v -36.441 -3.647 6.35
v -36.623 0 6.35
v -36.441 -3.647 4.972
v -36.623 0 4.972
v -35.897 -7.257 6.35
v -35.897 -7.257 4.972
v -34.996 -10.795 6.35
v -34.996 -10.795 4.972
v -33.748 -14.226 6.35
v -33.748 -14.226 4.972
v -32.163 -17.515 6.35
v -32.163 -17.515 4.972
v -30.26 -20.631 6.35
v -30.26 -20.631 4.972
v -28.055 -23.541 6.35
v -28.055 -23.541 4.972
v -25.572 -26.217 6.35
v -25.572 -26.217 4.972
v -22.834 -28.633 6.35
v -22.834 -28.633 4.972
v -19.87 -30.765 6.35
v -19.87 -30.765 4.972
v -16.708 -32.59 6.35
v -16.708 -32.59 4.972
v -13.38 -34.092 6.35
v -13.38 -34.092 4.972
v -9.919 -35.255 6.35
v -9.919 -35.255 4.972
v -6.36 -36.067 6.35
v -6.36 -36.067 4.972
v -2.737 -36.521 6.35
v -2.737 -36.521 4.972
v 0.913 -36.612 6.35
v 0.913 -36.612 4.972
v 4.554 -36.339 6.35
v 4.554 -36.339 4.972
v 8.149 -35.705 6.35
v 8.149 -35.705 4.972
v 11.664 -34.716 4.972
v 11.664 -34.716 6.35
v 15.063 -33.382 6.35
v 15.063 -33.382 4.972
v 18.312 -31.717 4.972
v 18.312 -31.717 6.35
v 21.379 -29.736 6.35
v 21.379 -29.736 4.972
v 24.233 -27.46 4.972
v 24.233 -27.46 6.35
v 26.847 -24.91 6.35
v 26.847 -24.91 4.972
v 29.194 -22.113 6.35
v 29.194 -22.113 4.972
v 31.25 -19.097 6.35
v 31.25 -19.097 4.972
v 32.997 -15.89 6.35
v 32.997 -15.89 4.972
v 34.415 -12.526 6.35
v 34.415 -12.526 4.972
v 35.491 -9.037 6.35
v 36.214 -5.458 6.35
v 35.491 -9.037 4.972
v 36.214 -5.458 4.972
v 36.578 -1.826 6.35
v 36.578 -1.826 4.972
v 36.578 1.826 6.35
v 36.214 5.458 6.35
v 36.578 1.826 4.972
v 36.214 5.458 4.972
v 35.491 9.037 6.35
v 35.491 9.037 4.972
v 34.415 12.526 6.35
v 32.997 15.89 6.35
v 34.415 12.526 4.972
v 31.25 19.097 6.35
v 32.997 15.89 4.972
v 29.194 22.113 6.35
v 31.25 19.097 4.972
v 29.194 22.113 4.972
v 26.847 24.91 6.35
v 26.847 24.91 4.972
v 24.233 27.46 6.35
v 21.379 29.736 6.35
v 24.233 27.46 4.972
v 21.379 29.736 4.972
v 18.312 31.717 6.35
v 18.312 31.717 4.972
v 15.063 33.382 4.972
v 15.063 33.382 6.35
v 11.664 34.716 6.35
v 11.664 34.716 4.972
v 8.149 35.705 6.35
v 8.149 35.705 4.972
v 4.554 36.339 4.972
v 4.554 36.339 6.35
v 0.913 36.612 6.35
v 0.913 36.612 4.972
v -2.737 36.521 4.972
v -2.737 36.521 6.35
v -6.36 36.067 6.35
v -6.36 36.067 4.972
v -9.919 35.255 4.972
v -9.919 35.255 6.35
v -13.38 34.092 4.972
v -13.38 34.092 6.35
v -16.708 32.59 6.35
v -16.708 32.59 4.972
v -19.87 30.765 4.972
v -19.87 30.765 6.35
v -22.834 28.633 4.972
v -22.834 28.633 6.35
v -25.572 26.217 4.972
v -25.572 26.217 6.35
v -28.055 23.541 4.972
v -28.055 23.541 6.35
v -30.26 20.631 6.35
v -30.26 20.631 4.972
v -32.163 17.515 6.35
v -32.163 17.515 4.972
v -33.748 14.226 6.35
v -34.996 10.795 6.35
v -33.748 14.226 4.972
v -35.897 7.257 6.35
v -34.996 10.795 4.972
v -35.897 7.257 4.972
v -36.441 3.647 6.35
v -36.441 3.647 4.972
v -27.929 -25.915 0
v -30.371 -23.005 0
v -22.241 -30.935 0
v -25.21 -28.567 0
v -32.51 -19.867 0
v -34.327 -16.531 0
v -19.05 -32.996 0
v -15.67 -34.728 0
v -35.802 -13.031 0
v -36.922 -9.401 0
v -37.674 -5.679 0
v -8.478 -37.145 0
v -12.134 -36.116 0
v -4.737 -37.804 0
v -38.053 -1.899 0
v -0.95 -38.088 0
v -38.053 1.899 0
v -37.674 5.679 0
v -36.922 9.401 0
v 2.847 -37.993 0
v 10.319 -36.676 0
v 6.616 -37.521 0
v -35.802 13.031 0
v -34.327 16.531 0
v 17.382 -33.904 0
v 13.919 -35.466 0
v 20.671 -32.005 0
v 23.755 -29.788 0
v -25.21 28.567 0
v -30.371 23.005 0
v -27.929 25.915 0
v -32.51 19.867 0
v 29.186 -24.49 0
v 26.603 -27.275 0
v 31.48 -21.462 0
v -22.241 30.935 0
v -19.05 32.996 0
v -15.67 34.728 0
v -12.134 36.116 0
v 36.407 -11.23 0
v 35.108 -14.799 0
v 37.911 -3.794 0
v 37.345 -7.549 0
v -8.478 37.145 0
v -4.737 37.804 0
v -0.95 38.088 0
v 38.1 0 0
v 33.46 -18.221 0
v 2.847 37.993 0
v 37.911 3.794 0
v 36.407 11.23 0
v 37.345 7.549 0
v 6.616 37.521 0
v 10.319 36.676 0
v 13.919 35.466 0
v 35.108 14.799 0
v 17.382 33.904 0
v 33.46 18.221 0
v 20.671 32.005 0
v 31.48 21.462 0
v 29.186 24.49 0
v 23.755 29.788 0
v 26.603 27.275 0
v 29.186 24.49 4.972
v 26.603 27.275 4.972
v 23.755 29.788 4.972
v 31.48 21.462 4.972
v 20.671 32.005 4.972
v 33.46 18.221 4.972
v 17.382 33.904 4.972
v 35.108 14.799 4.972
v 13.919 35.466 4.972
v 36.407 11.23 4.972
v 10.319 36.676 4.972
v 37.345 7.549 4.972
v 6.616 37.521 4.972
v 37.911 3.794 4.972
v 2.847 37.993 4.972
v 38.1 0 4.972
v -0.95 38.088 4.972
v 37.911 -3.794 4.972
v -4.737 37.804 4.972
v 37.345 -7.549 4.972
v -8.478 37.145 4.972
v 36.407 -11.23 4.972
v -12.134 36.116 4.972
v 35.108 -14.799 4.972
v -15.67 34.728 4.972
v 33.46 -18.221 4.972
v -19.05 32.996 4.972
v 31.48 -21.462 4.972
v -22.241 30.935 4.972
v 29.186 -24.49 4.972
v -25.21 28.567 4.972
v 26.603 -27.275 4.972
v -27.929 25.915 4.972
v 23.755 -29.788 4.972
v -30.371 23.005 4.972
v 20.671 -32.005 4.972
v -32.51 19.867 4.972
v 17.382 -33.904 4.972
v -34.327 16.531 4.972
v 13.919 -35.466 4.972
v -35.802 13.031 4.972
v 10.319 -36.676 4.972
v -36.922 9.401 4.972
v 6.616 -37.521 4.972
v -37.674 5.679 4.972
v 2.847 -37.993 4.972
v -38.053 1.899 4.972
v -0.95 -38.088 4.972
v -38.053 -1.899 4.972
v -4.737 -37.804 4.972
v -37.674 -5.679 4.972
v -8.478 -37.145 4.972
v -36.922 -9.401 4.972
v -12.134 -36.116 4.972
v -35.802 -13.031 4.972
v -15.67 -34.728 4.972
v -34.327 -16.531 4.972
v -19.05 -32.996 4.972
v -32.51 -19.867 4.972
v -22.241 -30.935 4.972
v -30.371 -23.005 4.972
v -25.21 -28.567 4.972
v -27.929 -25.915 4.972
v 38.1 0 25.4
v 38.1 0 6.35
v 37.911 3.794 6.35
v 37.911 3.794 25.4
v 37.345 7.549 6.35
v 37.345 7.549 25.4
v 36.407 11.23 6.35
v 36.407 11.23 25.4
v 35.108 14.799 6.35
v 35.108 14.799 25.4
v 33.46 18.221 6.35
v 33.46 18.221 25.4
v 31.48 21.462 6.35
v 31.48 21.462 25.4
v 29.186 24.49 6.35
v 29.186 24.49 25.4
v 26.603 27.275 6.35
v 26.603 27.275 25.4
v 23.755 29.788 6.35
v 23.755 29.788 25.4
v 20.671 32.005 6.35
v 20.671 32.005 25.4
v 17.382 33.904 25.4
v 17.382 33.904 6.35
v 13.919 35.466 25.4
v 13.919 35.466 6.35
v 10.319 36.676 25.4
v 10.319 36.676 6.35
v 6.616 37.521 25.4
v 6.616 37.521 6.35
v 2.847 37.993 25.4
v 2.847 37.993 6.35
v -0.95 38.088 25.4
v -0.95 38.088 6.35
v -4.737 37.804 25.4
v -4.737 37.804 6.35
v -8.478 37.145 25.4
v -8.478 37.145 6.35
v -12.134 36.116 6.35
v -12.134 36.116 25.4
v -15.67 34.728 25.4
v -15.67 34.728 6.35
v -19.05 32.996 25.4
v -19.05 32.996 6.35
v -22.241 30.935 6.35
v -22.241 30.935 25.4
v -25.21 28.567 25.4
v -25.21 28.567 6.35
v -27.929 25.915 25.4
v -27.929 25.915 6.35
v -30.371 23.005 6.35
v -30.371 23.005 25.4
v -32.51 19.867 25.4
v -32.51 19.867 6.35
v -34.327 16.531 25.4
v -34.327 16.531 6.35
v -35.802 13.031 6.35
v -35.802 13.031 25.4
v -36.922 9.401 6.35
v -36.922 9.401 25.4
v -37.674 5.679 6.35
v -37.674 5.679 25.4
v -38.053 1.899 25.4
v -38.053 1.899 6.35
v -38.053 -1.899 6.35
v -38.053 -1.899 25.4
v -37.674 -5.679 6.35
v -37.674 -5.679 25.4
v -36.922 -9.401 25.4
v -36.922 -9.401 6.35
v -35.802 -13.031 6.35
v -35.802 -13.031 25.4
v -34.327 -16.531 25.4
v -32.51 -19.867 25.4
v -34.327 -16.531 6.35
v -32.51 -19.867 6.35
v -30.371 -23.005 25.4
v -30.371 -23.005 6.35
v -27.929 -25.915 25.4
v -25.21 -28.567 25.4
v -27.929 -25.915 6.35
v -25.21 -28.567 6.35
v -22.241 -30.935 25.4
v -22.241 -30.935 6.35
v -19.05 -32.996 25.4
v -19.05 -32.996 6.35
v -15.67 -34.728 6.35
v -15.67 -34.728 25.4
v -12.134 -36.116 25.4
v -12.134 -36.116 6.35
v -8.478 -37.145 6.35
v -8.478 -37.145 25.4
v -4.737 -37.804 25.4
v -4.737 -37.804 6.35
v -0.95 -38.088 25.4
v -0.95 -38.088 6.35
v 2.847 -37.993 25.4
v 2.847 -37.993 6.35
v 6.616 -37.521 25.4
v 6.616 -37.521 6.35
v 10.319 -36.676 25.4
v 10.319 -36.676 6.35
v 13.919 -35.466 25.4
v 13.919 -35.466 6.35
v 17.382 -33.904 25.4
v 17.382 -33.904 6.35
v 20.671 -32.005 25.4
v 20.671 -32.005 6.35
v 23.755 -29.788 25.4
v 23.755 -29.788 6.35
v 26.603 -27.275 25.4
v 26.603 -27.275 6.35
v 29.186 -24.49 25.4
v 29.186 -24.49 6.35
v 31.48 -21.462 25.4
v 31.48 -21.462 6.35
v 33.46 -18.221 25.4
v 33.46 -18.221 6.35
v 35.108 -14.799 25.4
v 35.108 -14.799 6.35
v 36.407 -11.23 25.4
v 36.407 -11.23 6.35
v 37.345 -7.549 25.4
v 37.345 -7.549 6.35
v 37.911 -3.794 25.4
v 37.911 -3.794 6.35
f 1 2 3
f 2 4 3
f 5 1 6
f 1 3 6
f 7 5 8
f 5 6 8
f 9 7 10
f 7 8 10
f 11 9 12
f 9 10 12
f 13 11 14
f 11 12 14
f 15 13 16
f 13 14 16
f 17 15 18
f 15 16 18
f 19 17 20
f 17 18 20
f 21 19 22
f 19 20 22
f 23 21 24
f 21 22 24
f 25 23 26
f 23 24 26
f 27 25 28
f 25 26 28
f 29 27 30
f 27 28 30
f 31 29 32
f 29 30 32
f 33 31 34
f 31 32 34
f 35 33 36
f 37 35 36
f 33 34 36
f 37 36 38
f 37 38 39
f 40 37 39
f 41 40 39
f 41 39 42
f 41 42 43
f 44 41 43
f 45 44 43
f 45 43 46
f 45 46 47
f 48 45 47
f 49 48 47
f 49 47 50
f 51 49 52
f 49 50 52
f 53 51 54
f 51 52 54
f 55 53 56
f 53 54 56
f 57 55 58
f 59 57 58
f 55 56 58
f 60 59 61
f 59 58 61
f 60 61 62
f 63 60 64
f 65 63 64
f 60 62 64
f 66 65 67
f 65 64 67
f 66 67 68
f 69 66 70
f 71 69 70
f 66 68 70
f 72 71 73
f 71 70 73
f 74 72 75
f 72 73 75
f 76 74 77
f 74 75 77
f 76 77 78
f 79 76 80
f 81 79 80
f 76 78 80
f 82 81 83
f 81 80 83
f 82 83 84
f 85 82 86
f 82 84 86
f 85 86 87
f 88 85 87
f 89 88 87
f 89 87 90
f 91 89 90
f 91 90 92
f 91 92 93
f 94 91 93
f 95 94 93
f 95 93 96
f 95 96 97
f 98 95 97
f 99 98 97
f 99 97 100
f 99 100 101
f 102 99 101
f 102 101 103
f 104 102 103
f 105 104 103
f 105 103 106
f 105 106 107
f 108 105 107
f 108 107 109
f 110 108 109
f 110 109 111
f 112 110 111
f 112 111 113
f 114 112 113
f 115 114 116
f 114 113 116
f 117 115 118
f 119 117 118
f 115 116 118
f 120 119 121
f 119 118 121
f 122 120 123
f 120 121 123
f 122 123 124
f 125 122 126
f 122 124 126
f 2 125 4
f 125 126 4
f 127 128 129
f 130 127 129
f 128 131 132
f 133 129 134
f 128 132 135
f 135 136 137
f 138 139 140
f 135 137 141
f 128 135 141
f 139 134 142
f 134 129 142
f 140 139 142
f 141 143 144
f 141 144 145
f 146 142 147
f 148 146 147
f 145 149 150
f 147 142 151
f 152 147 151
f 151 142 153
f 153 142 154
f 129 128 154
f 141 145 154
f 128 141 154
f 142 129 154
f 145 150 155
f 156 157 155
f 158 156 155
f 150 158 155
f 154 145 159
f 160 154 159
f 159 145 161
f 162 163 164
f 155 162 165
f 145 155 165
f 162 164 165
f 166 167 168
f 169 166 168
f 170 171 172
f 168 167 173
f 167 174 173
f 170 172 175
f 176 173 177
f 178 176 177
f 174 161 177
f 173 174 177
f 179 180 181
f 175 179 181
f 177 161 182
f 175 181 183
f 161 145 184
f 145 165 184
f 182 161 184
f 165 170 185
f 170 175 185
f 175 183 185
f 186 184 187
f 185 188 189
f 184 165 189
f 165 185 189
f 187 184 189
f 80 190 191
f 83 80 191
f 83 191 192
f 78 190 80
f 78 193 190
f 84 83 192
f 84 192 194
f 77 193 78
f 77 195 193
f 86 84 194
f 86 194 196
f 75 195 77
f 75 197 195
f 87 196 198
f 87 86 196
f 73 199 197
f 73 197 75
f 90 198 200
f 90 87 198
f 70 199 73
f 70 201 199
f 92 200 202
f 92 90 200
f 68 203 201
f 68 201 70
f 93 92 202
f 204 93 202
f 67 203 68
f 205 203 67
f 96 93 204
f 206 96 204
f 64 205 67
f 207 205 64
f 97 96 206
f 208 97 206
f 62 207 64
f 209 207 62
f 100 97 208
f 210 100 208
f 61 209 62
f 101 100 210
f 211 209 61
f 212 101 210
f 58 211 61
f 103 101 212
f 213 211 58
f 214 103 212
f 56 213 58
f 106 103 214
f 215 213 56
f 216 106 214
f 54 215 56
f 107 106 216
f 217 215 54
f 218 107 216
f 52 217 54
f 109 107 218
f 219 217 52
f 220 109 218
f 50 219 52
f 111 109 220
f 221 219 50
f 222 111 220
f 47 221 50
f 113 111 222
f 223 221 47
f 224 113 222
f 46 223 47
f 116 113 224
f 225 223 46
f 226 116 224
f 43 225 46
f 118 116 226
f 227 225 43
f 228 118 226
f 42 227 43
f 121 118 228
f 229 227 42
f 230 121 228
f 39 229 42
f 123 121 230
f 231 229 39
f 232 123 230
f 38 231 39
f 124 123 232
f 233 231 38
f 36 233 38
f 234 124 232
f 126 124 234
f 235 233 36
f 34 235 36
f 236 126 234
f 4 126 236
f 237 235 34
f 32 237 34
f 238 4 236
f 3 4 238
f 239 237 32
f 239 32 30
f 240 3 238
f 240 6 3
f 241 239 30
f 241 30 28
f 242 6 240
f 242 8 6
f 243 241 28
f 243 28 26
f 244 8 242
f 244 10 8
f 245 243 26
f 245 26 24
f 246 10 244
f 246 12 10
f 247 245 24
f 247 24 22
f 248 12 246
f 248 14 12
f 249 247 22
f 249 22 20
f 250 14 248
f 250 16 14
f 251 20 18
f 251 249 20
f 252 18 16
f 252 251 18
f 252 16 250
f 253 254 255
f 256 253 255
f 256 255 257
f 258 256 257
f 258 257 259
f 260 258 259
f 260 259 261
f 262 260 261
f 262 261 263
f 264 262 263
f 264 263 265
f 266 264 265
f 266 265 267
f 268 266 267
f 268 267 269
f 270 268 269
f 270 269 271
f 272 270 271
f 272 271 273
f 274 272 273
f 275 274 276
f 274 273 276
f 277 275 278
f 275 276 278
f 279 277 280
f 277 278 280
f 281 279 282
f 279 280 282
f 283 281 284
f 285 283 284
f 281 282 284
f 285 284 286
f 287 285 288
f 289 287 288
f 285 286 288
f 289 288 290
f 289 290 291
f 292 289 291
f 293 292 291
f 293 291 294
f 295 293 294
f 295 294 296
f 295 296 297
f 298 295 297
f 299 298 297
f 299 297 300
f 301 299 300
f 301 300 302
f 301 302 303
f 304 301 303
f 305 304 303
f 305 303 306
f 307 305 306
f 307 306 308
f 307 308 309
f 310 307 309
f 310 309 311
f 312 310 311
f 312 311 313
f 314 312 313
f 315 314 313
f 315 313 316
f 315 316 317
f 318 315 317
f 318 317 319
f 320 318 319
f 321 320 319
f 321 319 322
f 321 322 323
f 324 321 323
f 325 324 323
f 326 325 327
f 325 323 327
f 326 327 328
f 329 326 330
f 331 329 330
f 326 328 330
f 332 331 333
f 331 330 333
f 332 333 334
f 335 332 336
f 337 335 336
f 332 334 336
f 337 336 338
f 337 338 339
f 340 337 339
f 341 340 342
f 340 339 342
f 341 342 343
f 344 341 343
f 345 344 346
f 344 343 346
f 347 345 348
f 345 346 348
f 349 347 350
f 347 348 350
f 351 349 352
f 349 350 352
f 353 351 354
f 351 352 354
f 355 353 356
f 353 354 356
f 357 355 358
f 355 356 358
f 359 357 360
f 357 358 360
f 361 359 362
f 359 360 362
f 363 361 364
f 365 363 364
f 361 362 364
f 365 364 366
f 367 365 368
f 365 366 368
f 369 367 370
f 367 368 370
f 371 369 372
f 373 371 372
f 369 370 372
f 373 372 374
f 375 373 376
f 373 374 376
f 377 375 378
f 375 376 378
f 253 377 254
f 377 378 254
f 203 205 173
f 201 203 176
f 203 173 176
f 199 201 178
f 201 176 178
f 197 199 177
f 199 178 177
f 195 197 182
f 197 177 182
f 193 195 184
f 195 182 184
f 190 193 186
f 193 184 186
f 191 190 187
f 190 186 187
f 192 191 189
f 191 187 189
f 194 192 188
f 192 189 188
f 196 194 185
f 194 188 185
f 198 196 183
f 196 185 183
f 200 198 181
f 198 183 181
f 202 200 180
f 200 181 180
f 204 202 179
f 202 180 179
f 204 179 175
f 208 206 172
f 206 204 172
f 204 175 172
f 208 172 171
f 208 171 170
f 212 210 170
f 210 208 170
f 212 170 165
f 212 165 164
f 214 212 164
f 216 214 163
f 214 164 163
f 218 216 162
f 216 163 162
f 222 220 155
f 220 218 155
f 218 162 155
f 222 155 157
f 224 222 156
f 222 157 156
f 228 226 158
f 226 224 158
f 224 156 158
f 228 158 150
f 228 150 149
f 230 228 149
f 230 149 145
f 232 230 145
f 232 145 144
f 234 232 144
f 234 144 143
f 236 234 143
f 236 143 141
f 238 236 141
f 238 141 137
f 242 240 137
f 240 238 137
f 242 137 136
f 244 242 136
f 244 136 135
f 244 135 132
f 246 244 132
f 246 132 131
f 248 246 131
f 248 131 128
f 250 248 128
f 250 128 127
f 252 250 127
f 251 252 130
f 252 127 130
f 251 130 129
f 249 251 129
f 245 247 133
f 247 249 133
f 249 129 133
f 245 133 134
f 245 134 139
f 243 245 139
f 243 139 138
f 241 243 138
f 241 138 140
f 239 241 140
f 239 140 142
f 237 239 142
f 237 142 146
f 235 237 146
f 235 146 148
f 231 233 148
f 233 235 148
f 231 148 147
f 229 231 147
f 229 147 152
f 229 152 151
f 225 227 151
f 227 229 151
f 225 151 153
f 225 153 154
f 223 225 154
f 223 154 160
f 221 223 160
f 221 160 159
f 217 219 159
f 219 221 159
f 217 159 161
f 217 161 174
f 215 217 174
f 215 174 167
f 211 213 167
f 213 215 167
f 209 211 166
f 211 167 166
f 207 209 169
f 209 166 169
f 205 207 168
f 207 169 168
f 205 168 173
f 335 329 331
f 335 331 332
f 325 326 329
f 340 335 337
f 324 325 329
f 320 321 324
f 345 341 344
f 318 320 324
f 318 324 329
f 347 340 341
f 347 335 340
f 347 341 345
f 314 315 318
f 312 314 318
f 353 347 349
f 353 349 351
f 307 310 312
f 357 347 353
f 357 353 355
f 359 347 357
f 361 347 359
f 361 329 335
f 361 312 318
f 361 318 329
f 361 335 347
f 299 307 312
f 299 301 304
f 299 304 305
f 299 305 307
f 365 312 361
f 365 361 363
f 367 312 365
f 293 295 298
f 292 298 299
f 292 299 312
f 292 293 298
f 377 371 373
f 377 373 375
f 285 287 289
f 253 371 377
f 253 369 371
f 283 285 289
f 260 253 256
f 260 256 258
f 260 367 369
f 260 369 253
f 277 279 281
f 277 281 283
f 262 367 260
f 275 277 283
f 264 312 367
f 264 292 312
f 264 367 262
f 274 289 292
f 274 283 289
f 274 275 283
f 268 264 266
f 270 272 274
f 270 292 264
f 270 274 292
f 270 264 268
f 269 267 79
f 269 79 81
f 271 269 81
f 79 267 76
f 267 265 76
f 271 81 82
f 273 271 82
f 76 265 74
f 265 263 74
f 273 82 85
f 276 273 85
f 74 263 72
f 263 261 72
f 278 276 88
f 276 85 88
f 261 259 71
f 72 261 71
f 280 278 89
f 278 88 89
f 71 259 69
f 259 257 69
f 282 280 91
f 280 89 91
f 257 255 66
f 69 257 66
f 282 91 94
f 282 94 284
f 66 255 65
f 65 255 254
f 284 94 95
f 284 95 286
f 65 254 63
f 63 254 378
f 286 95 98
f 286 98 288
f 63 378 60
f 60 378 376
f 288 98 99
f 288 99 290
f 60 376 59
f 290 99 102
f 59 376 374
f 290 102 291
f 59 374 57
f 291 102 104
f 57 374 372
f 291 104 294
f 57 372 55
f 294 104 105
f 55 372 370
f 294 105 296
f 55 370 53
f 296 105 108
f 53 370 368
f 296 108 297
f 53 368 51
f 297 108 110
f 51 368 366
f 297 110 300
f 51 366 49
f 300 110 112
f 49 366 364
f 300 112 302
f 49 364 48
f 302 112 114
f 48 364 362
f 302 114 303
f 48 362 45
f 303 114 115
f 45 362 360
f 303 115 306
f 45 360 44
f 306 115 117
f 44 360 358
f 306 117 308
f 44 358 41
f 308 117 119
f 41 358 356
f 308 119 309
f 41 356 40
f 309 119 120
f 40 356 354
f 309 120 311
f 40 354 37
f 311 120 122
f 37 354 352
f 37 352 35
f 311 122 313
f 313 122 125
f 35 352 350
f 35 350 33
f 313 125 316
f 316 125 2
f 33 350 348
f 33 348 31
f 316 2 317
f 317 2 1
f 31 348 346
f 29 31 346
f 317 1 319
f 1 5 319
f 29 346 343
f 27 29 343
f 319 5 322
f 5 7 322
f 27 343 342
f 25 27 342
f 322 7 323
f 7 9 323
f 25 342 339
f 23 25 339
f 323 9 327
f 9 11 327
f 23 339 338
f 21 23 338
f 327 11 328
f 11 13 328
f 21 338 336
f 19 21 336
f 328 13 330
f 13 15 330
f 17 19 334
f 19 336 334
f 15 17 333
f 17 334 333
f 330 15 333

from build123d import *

# Parameters (mm, degrees)
SKETCH1_R           = 38.1
BOSS_EXTRUDE1_DEPTH = 25.4
SKETCH2_W           = 1.476595825
SKETCH2_H           = 1.378223542


with BuildPart() as part:
    # Sketch1 → Boss-Extrude1 (new body)
    with BuildSketch(Plane.XY):
        Circle(SKETCH1_R)
    extrude(amount=BOSS_EXTRUDE1_DEPTH)

    # Sketch2 → Cut-Revolve1 (revolve, cut)
    with BuildSketch(Plane(origin=(0, 0, 0), x_dir=(1, 0, 0), z_dir=(0, 1, 0))):
        with Locations((-37.361702088, -5.660888229)):
            Rectangle(SKETCH2_W, SKETCH2_H)
    revolve(axis=Axis((0, 0, 0), (0, 0, 1)), mode=Mode.SUBTRACT)


solid = part.part
